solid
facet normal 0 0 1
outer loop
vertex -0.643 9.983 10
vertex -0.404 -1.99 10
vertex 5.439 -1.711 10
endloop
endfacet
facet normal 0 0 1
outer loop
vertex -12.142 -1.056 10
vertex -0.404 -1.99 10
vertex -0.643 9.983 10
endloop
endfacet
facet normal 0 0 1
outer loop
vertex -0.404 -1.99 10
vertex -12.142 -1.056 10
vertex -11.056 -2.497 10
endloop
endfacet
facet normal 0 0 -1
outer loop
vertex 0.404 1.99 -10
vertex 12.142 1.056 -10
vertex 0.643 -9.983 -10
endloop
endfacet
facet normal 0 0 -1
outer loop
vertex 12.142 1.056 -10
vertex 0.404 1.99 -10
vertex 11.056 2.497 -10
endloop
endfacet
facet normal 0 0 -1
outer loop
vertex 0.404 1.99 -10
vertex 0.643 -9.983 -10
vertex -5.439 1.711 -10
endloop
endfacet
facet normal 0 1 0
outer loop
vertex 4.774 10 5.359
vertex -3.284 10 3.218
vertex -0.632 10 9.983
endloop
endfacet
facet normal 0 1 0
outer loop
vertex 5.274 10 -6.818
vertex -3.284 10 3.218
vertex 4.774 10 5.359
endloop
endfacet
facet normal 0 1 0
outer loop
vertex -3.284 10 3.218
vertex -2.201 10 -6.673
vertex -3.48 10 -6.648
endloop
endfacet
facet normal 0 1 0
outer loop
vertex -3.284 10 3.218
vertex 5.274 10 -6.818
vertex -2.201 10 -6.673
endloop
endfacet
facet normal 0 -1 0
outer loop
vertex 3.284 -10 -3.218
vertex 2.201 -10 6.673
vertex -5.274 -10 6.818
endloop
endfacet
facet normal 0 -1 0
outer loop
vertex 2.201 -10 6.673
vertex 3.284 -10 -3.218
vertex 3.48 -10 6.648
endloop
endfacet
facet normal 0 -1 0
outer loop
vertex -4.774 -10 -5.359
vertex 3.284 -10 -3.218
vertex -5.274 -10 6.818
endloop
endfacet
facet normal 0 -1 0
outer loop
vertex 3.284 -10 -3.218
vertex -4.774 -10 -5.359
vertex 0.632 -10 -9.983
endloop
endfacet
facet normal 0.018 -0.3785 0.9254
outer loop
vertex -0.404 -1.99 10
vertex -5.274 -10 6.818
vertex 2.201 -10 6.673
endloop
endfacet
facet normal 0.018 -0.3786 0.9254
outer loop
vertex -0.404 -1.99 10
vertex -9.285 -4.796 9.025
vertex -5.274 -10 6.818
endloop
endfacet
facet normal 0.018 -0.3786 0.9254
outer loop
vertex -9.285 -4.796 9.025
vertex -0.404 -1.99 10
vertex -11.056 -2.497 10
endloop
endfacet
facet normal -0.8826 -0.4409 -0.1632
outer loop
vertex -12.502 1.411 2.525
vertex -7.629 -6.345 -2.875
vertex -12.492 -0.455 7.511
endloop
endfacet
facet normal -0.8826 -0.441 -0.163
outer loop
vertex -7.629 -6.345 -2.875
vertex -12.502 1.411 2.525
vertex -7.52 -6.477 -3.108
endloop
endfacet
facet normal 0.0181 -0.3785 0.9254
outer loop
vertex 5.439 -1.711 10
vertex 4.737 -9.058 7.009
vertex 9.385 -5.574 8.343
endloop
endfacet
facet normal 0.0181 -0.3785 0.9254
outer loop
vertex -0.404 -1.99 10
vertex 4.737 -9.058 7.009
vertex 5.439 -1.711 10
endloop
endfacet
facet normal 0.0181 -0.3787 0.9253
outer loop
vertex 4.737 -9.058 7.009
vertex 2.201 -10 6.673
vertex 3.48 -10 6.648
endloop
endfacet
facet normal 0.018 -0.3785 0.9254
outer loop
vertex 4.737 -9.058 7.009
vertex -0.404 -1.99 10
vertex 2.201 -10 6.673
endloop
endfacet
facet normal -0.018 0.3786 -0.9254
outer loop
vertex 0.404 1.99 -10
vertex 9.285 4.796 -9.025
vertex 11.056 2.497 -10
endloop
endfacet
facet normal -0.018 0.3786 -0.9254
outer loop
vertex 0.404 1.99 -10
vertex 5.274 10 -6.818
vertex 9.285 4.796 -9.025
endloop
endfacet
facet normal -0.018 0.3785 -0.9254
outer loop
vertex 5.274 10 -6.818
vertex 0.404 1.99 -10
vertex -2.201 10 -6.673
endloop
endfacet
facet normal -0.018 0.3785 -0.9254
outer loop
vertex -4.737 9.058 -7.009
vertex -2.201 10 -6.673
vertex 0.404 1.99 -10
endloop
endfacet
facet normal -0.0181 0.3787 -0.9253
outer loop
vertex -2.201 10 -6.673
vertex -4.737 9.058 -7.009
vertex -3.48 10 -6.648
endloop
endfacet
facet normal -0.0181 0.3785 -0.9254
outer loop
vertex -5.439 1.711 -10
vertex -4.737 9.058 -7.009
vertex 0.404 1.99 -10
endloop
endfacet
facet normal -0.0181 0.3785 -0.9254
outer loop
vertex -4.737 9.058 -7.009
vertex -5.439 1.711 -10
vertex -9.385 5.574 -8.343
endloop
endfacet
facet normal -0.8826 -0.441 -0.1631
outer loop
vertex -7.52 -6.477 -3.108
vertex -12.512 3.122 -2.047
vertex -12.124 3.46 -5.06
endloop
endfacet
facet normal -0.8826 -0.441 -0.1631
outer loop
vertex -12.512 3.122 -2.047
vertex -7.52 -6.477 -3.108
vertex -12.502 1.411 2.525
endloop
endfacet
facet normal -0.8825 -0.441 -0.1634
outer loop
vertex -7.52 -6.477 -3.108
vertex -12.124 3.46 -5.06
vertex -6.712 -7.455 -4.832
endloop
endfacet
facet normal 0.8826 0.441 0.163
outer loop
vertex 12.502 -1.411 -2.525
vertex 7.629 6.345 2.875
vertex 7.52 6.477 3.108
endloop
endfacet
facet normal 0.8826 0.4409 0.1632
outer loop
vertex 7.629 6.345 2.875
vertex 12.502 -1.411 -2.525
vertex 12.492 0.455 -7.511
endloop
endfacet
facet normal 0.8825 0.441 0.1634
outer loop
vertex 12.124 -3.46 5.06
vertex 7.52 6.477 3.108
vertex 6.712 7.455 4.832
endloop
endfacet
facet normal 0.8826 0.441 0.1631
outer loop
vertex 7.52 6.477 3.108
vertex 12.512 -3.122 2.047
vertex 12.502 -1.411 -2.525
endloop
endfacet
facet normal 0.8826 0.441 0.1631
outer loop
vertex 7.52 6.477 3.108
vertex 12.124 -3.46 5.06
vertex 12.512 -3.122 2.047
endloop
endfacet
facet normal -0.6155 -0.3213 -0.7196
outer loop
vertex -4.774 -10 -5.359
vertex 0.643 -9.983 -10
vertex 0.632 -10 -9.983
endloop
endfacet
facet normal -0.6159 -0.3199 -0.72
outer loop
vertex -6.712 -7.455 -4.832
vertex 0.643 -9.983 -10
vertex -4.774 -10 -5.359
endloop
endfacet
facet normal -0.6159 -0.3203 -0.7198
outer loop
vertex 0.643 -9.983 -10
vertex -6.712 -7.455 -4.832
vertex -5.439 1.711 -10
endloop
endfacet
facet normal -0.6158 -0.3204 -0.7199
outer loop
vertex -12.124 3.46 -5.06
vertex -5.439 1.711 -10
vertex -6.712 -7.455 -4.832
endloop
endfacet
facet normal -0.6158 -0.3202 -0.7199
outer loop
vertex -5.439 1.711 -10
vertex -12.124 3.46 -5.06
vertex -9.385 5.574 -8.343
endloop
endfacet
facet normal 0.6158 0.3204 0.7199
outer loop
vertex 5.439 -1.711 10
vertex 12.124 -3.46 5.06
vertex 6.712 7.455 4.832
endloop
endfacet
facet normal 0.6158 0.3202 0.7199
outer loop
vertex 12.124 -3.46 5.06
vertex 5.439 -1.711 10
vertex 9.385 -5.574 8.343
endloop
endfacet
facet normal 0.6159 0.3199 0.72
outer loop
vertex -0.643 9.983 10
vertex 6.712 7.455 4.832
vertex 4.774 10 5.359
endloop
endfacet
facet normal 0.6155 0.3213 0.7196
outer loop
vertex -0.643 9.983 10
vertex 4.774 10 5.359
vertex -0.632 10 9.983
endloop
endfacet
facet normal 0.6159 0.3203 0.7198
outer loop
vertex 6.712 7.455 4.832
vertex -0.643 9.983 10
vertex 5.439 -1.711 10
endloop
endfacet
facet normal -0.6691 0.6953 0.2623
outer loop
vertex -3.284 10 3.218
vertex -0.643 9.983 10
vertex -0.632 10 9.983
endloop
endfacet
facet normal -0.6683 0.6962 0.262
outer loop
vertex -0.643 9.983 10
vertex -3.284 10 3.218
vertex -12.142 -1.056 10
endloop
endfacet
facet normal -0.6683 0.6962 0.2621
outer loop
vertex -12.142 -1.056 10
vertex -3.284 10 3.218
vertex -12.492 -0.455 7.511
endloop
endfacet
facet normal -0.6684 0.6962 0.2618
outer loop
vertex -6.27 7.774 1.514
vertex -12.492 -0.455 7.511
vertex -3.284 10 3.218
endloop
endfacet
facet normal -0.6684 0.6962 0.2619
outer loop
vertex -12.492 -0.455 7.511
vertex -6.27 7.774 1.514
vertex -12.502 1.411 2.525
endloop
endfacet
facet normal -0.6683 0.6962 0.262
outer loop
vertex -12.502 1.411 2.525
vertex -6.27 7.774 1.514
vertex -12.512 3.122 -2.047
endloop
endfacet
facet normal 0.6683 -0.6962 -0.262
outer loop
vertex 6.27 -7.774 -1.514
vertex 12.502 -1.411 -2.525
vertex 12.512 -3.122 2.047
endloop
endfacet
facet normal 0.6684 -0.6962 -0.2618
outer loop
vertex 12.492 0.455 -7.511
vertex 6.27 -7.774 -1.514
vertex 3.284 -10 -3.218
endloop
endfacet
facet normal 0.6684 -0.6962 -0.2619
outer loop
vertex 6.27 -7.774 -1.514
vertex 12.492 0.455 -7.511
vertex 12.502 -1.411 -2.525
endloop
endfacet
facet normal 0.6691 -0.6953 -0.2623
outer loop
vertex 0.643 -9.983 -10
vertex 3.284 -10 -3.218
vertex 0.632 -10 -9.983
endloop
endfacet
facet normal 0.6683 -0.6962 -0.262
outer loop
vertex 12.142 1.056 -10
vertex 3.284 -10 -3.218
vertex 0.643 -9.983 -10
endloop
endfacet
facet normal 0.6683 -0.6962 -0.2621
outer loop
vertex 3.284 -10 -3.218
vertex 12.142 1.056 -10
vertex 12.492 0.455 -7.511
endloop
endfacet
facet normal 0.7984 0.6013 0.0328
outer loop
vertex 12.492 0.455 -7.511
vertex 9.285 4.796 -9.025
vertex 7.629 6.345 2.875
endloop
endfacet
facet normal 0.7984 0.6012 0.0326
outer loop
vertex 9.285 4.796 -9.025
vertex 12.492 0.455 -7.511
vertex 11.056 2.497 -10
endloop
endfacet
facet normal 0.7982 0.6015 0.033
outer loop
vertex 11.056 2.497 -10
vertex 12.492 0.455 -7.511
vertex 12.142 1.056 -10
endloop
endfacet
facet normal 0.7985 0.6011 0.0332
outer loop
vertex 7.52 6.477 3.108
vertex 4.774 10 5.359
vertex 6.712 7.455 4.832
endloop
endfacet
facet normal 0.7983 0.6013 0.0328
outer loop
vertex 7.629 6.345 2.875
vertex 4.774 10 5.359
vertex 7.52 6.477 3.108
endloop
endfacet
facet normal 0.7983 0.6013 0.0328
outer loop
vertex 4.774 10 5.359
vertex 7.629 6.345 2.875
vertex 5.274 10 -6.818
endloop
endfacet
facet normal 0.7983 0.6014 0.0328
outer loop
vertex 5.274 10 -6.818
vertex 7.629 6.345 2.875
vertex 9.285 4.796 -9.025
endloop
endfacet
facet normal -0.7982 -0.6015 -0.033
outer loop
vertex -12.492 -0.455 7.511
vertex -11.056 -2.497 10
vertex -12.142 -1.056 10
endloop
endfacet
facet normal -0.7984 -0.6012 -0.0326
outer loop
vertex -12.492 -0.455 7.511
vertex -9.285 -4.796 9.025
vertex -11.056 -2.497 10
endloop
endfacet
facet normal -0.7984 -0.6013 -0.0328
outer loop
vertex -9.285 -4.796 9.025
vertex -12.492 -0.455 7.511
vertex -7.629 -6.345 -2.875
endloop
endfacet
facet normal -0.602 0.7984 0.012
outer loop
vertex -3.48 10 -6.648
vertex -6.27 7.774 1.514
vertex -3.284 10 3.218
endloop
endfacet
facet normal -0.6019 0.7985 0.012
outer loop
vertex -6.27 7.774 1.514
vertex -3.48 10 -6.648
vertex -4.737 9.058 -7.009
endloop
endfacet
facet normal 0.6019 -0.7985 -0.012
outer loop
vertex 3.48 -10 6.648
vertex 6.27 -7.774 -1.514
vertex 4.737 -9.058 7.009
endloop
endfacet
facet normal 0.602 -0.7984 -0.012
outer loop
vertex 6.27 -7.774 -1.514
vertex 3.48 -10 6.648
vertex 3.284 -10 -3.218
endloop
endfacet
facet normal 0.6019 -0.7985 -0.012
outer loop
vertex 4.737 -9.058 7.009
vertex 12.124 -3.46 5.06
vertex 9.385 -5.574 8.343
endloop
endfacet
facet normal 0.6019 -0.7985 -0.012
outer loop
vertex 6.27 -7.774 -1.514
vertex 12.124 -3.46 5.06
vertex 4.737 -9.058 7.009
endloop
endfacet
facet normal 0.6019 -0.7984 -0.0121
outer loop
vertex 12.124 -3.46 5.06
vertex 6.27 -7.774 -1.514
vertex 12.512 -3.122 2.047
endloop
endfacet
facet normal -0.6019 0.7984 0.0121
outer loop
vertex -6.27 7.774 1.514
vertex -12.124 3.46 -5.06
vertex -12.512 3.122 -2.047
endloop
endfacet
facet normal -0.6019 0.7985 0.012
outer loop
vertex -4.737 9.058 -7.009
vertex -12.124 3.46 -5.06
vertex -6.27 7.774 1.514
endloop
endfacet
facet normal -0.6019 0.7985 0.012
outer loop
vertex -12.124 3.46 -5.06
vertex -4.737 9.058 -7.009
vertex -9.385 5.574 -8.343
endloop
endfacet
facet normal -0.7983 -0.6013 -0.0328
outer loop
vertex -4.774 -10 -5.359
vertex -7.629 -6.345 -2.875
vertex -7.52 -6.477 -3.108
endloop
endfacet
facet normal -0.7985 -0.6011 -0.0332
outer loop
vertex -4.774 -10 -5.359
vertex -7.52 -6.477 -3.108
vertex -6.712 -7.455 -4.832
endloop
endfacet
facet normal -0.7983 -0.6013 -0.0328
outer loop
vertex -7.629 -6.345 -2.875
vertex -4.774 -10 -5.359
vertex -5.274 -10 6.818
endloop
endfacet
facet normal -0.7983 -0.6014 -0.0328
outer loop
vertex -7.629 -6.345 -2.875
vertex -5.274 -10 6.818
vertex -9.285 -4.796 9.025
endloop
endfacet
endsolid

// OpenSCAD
/*
 *  OpenSCAD (www.openscad.org)
 *  Copyright (C) 2009-2011 Clifford Wolf <clifford@clifford.at> and
 *                          Marius Kintel <marius@kintel.net>
 *
 *  This program is free software; you can redistribute it and/or modify
 *  it under the terms of the GNU General Public License as published by
 *  the Free Software Foundation; either version 2 of the License, or
 *  (at your option) any later version.
 *
 *  This program is distributed in the hope that it will be useful,
 *  but WITHOUT ANY WARRANTY; without even the implied warranty of
 *  MERCHANTABILITY or FITNESS FOR A PARTICULAR PURPOSE.  See the
 *  GNU General Public License for more details.
 *
 *  You should have received a copy of the GNU General Public License
 *  along with this program; if not, write to the Free Software
 *  Foundation, Inc., 59 Temple Place, Suite 330, Boston, MA  02111-1307  USA
 *
 */

intersection_for(i = [
			[0, 0, 0],
			[10, 20, 300],
			[200, 40, 57],
			[20, 88, 57]
		])
	rotate(i) cube([100, 20, 20], center = true);
